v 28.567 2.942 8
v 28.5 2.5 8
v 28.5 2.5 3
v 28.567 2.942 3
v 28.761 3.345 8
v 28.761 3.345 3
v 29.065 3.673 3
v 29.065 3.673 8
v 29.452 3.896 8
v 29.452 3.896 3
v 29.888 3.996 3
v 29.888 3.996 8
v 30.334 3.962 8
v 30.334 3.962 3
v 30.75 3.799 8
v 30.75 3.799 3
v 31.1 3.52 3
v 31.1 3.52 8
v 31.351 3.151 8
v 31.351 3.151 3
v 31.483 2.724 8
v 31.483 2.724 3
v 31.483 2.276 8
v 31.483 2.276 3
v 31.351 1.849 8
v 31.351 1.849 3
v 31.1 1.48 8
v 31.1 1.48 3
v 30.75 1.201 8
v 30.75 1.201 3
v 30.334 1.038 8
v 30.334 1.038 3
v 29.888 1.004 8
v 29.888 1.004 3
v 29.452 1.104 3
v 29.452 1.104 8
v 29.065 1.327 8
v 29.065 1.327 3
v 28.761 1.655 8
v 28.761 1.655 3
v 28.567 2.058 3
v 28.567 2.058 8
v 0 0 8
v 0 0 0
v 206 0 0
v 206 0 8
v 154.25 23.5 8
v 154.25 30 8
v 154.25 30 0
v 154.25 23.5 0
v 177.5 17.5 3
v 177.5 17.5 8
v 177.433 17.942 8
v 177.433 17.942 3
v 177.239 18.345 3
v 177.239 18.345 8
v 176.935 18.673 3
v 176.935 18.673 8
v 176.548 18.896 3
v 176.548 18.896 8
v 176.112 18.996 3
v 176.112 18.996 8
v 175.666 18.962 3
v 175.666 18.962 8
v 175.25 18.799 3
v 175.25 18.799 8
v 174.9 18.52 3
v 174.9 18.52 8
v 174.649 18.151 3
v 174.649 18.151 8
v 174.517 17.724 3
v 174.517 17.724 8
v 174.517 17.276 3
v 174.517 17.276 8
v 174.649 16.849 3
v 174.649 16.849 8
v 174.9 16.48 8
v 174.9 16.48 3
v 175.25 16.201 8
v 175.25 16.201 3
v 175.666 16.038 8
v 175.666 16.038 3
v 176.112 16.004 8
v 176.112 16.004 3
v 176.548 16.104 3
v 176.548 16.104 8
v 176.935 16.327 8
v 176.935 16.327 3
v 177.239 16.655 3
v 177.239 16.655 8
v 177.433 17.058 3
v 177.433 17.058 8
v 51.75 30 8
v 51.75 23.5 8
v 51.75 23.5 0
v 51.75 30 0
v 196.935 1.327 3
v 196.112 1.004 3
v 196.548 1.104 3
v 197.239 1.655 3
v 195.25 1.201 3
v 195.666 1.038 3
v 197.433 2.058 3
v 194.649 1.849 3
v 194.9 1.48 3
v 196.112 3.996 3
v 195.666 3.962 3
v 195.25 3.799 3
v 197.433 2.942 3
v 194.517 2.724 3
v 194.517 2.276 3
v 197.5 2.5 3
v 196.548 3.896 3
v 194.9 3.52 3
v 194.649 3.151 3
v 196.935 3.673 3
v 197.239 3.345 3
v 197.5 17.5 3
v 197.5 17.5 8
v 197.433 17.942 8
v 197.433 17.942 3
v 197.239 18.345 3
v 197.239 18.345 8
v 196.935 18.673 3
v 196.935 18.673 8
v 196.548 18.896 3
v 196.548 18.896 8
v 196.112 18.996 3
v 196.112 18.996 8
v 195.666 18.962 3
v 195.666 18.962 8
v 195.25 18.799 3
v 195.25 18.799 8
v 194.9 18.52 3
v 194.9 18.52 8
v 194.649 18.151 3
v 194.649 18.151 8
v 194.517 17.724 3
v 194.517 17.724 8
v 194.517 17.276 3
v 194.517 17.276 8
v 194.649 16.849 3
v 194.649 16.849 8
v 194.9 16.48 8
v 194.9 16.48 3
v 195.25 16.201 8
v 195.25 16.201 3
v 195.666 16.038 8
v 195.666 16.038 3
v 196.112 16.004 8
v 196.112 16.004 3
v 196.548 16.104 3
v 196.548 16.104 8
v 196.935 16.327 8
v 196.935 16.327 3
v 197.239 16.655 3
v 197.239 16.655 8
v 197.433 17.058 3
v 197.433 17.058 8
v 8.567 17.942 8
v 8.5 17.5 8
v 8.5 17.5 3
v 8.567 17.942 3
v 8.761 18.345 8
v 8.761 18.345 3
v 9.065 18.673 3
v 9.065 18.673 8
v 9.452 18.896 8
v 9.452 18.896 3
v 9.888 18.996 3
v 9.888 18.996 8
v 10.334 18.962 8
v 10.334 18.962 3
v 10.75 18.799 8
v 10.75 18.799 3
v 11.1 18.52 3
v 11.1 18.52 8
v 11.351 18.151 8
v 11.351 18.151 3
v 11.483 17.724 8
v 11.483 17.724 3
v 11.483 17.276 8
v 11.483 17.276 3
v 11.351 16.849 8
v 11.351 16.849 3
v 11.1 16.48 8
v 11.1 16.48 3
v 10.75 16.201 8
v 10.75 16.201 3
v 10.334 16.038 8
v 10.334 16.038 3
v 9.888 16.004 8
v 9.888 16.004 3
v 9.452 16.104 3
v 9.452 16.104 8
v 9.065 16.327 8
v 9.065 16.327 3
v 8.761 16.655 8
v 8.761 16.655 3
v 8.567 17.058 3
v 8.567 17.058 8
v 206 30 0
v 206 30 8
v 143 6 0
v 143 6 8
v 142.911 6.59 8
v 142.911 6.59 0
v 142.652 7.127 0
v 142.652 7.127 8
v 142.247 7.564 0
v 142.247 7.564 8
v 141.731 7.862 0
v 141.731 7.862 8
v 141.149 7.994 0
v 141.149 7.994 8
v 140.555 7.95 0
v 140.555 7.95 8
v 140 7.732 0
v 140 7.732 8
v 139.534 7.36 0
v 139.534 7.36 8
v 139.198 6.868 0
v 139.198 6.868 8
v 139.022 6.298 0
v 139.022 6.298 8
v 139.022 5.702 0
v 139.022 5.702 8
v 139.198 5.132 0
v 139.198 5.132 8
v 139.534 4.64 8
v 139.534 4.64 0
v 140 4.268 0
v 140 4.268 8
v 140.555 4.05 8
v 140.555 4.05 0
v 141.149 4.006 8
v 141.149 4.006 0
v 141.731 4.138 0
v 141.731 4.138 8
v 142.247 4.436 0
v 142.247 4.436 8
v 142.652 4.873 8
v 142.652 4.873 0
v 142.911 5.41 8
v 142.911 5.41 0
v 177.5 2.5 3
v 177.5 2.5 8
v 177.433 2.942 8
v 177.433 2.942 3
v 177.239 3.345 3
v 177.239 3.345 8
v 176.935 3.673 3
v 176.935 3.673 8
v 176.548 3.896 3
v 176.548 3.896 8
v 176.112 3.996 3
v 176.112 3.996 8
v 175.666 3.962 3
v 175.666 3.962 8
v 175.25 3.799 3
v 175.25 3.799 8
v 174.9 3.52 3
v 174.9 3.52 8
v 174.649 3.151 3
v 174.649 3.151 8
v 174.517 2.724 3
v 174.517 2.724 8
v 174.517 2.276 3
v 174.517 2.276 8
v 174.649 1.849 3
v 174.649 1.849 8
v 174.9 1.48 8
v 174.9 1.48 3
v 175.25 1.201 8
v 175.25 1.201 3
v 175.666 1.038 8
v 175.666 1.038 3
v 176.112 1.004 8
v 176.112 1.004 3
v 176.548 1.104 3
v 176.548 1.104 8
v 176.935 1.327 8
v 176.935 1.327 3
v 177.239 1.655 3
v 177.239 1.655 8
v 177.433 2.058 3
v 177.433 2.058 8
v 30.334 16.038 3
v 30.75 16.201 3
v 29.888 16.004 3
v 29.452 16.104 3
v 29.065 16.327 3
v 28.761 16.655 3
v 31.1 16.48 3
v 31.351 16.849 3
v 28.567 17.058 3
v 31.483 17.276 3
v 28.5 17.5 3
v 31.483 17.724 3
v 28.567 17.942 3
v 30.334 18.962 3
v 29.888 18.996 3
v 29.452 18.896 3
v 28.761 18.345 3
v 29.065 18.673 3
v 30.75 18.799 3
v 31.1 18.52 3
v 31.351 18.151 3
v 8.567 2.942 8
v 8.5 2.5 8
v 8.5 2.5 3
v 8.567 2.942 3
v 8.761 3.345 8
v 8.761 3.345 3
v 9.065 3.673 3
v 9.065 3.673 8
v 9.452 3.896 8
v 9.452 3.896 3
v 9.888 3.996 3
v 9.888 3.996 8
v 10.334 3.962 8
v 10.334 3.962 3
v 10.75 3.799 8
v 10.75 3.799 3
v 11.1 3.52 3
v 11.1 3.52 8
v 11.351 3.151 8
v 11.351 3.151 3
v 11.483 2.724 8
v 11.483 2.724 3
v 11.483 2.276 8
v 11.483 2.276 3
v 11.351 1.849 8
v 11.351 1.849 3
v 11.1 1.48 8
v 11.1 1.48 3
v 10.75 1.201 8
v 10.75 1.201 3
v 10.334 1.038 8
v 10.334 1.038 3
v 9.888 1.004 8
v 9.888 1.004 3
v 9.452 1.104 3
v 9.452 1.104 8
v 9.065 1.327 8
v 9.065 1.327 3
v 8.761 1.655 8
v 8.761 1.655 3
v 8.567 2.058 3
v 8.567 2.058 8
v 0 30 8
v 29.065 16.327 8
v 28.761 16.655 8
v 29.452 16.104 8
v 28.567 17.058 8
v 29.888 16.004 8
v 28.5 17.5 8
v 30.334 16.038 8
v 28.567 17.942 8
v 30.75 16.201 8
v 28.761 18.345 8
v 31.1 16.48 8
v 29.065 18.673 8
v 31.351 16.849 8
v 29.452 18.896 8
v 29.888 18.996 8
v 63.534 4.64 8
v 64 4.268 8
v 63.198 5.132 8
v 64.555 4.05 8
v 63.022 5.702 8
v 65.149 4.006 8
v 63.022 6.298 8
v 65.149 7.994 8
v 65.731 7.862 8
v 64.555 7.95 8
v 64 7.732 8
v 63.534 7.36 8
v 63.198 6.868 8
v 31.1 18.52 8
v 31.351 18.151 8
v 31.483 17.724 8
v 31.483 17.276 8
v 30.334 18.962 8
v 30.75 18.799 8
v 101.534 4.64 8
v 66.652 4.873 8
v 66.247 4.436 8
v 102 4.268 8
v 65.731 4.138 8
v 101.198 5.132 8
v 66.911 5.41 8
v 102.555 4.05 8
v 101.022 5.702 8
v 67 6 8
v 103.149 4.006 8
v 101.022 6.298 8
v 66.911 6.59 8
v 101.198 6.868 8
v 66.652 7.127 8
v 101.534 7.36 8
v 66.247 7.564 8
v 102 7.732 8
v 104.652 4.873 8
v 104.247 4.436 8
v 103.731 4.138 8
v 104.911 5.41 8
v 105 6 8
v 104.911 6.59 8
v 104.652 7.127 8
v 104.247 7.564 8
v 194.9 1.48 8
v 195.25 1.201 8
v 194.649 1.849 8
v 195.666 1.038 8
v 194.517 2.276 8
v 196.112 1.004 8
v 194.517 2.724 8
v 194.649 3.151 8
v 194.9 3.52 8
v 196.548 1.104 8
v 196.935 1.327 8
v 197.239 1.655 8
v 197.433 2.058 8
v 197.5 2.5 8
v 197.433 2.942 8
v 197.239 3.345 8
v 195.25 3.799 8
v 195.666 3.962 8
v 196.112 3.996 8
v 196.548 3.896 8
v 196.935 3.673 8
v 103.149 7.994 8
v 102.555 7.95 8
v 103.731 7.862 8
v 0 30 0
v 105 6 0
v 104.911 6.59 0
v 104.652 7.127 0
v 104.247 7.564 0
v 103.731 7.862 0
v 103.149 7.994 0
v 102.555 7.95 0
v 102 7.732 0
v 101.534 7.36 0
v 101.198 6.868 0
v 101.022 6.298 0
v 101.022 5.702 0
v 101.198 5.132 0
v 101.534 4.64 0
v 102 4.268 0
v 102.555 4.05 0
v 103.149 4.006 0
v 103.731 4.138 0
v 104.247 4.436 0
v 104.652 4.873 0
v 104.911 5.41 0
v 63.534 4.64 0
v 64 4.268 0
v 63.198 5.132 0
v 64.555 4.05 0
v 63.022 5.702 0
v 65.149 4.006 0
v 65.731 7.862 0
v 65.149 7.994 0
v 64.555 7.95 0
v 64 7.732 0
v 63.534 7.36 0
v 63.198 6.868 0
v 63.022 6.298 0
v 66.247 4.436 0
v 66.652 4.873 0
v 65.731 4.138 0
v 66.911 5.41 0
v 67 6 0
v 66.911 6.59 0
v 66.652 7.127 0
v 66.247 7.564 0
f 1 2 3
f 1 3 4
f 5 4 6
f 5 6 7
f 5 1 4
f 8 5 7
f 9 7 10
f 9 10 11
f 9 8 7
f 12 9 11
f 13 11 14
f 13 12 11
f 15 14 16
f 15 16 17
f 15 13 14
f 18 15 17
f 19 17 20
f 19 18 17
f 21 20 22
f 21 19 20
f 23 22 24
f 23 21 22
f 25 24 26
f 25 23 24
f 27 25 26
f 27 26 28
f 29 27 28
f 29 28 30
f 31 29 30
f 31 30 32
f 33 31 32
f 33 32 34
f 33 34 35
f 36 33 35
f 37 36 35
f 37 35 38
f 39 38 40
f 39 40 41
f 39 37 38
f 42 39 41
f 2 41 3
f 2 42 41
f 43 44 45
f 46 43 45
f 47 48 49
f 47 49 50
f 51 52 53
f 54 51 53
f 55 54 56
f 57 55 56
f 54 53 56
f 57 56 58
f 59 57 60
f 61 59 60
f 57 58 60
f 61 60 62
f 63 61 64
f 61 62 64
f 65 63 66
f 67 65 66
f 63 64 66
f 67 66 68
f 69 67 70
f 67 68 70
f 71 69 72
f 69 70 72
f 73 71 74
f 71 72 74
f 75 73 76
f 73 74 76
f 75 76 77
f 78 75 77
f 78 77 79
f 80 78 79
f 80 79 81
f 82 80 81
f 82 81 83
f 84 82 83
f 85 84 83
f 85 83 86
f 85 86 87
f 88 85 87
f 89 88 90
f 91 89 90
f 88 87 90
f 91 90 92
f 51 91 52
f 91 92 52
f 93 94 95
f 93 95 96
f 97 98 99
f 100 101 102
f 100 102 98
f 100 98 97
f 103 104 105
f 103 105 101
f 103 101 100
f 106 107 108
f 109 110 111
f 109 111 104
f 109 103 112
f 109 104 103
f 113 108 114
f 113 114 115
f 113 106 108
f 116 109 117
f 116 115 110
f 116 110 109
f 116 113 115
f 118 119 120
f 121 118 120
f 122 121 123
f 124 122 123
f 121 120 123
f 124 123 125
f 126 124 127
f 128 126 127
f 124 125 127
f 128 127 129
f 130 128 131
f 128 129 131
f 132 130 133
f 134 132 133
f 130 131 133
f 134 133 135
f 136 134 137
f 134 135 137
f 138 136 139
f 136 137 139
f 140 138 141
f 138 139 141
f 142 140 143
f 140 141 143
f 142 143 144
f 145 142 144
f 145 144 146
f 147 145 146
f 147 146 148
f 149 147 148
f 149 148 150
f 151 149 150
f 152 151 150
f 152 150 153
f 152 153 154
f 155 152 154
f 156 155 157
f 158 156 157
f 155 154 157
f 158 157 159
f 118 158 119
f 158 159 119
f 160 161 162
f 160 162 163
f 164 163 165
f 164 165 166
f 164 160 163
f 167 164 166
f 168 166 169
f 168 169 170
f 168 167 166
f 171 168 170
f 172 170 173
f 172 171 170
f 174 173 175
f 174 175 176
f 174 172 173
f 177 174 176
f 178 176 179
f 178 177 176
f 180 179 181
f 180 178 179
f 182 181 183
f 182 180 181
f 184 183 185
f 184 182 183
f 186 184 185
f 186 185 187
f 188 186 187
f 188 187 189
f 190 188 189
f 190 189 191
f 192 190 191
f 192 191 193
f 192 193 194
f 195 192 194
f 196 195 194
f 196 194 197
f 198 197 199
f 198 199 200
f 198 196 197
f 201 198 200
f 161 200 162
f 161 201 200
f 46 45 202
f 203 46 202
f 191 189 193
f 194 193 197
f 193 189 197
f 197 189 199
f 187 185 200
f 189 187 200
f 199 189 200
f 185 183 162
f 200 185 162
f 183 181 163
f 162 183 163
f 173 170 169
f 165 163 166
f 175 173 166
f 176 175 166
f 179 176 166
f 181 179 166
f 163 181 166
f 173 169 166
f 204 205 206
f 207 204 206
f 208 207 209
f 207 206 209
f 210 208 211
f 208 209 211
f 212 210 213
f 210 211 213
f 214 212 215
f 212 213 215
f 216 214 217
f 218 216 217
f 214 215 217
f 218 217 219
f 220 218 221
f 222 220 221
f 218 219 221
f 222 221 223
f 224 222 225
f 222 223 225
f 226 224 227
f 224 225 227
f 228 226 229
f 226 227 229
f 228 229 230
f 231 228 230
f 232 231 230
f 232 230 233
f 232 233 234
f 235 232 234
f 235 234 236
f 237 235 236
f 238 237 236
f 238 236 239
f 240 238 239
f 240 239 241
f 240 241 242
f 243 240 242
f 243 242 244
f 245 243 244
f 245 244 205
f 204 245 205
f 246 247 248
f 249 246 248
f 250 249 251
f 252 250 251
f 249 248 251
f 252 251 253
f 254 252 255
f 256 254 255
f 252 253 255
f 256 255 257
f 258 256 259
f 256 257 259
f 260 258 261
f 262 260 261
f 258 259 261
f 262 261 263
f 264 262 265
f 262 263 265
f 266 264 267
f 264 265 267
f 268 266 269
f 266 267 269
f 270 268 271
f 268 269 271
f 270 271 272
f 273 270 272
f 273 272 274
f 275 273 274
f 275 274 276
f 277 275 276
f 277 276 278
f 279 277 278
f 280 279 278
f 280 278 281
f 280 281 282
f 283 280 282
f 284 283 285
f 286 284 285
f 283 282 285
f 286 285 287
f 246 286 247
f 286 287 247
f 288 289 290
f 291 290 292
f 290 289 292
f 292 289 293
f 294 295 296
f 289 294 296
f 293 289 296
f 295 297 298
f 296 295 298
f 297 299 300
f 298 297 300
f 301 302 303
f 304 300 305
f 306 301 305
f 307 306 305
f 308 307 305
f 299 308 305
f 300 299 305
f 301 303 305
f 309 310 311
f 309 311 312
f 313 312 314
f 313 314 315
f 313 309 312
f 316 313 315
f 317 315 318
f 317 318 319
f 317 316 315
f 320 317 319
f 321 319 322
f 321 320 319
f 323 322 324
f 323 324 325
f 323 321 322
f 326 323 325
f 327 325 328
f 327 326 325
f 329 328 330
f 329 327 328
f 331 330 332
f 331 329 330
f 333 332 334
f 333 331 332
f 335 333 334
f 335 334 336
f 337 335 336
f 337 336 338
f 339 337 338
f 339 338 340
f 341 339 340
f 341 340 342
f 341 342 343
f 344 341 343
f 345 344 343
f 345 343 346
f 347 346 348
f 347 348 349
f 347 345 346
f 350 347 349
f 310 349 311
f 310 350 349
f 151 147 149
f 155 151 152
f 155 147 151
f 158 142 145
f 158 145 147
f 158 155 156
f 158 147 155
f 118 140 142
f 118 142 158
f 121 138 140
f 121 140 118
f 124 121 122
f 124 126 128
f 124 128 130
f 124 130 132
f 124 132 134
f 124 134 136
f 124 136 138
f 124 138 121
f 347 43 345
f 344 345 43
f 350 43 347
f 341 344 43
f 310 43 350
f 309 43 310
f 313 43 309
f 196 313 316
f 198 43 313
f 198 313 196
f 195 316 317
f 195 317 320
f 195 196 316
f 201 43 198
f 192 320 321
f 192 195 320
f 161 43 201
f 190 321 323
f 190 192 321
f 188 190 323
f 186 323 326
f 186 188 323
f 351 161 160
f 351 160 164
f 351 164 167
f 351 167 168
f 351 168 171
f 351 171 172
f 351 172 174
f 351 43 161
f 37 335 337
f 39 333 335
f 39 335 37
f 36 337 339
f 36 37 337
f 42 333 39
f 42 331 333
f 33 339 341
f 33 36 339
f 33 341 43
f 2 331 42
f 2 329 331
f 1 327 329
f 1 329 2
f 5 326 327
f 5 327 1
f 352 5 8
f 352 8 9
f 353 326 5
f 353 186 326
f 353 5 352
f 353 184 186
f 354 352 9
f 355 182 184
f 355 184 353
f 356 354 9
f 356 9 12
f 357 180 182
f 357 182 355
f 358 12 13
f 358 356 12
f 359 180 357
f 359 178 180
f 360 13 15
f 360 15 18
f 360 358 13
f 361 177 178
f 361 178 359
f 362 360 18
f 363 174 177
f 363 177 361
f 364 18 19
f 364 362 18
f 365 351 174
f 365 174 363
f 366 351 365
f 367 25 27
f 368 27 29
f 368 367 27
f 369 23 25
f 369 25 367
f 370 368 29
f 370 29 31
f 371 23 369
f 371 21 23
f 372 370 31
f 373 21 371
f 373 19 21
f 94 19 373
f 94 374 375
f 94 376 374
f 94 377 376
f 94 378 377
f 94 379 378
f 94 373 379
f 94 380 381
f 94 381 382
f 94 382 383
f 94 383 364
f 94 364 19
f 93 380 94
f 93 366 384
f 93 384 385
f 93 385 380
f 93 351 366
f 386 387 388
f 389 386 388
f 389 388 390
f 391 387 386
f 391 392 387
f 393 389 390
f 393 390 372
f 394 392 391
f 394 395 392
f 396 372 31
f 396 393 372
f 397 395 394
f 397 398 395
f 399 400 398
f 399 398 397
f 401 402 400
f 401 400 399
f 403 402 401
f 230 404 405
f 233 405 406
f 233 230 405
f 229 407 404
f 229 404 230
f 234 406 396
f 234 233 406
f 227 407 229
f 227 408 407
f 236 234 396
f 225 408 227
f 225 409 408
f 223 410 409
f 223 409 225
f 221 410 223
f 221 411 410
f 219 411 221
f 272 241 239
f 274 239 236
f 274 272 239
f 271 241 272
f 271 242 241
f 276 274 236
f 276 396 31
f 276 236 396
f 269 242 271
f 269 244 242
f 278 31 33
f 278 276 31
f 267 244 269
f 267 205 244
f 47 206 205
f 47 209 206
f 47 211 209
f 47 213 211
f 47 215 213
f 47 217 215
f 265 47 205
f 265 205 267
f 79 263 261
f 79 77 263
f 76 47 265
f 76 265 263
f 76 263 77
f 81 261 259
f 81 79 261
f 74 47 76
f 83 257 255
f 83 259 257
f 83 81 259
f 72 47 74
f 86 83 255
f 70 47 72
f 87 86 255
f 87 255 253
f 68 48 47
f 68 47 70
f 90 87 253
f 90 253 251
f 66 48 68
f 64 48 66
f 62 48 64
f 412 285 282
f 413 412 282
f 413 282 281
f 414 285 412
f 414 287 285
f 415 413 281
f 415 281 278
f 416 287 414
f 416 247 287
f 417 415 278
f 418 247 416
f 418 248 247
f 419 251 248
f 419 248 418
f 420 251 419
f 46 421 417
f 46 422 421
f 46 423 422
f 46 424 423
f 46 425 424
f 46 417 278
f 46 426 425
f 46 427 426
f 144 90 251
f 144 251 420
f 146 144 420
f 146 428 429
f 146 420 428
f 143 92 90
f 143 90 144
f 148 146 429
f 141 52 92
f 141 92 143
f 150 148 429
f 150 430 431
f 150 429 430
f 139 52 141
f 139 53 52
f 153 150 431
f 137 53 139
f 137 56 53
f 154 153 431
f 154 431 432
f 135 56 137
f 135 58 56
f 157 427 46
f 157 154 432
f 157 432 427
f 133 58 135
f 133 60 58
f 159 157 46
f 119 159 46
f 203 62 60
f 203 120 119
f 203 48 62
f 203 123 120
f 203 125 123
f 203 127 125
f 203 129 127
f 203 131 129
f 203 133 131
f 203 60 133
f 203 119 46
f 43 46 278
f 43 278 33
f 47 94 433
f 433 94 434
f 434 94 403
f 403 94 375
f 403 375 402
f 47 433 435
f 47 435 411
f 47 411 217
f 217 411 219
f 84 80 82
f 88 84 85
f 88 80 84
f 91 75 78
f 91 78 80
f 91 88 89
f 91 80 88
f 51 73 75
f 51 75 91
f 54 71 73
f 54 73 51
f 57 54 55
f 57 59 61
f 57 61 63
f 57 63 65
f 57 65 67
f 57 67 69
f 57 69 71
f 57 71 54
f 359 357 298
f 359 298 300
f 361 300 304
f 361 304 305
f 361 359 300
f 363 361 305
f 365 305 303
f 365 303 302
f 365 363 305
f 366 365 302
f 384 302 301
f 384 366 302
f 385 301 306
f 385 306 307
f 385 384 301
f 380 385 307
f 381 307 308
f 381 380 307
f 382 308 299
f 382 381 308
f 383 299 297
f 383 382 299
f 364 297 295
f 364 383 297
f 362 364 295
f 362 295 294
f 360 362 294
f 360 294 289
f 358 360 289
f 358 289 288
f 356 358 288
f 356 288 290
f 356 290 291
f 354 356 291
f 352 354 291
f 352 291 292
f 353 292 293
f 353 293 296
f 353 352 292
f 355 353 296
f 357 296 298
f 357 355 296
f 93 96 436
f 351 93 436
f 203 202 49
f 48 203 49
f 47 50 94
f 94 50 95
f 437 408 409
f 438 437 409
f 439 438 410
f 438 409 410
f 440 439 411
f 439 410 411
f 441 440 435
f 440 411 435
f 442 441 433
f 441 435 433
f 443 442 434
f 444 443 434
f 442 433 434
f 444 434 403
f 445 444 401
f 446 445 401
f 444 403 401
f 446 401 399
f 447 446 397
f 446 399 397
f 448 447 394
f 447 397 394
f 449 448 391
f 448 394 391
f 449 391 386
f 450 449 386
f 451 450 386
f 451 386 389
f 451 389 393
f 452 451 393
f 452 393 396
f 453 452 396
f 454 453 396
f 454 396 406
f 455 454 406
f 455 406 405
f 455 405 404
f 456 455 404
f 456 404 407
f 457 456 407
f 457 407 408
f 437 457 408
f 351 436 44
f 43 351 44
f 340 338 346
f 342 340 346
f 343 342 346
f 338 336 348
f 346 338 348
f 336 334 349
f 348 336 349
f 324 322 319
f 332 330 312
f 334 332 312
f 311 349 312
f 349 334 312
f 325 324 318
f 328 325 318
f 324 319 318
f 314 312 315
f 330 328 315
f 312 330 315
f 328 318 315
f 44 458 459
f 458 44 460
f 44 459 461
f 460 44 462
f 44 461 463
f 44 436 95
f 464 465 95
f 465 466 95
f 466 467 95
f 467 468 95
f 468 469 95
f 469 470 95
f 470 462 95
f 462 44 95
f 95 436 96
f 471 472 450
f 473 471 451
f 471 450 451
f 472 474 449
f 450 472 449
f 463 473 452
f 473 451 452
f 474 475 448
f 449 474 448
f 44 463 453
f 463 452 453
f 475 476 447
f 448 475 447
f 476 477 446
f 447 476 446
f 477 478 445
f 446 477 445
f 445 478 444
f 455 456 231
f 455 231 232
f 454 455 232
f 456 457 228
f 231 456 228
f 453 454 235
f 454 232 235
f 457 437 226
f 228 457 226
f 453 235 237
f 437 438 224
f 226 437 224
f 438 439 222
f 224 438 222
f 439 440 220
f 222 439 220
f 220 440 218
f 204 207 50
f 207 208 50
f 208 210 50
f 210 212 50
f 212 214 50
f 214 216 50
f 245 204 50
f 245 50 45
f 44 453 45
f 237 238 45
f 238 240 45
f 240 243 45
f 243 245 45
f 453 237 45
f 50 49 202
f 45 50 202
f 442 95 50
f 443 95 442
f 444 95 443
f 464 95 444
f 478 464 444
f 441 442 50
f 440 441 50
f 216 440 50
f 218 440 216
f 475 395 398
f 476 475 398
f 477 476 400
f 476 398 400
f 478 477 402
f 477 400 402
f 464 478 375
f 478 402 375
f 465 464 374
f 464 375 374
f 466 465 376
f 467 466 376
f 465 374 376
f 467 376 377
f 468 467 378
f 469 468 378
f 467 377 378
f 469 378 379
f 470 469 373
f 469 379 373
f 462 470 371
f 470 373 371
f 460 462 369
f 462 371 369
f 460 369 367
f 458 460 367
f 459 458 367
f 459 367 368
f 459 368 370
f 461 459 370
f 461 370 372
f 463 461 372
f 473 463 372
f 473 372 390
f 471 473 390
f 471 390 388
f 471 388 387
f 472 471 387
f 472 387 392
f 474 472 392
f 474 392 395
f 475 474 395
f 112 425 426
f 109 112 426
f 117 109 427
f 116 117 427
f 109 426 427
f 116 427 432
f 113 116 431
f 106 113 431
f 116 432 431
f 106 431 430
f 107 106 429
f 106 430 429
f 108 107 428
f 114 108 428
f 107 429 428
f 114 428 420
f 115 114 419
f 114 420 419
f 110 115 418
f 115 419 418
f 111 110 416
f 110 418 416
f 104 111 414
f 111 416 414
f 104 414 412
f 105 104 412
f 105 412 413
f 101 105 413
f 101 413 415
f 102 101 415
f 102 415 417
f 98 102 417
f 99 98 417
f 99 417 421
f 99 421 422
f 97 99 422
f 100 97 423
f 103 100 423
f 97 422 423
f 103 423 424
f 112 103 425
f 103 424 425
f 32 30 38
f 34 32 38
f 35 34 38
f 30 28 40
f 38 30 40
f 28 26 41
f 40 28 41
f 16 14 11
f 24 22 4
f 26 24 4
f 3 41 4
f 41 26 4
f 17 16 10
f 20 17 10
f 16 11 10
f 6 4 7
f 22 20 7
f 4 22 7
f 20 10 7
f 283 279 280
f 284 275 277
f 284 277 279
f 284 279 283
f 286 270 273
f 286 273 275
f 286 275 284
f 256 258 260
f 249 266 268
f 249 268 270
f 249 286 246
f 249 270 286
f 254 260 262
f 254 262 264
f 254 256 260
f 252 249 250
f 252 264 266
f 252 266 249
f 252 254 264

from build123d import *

# Parameters (mm, degrees)
BOSS_EXTRU_1_DEPTH      = 8
ESQUISSE2_R             = 2
ENL_V_MAT_EXTRU_1_DEPTH = 9
ESQUISSE3_R             = 1.5
ENL_V_MAT_EXTRU_2_DEPTH = 5


with BuildPart() as part:
    # Esquisse1 → Boss.-Extru.1 (new body)
    with BuildSketch(Plane.XY):
        Polygon((0, 30), (0, 0), (206, 0), (206, 30), (154.25, 30), (154.25, 23.5), (51.75, 23.5), (51.75, 30), align=None)
    extrude(amount=BOSS_EXTRU_1_DEPTH)

    # Esquisse2 → Enlèv. mat.-Extru.1 (cut, through all)
    with BuildSketch(Plane.XY.offset(8)):
        with Locations((103, 6)):
            Circle(ESQUISSE2_R)
        with Locations((141, 6)):
            Circle(ESQUISSE2_R)
        with Locations((65, 6)):
            Circle(ESQUISSE2_R)
    extrude(amount=-ENL_V_MAT_EXTRU_1_DEPTH, mode=Mode.SUBTRACT)

    # Esquisse3 → Enlèv. mat.-Extru.2 (cut)
    with BuildSketch(Plane.XY.offset(8)):
        with Locations((176, 17.5)):
            Circle(ESQUISSE3_R)
        with Locations((196, 17.5)):
            Circle(ESQUISSE3_R)
        with Locations((196, 2.5)):
            Circle(ESQUISSE3_R)
        with Locations((176, 2.5)):
            Circle(ESQUISSE3_R)
    enl_v_mat_extru_2 = extrude(amount=-ENL_V_MAT_EXTRU_2_DEPTH, mode=Mode.SUBTRACT)

    # Symétrie1: Enlèv. mat.-Extru.2 across plane
    add(enl_v_mat_extru_2.mirror(Plane(origin=(103, 0, 0), x_dir=(0, 0, 1), z_dir=(1, 0, 0))), mode=Mode.SUBTRACT)


solid = part.part
